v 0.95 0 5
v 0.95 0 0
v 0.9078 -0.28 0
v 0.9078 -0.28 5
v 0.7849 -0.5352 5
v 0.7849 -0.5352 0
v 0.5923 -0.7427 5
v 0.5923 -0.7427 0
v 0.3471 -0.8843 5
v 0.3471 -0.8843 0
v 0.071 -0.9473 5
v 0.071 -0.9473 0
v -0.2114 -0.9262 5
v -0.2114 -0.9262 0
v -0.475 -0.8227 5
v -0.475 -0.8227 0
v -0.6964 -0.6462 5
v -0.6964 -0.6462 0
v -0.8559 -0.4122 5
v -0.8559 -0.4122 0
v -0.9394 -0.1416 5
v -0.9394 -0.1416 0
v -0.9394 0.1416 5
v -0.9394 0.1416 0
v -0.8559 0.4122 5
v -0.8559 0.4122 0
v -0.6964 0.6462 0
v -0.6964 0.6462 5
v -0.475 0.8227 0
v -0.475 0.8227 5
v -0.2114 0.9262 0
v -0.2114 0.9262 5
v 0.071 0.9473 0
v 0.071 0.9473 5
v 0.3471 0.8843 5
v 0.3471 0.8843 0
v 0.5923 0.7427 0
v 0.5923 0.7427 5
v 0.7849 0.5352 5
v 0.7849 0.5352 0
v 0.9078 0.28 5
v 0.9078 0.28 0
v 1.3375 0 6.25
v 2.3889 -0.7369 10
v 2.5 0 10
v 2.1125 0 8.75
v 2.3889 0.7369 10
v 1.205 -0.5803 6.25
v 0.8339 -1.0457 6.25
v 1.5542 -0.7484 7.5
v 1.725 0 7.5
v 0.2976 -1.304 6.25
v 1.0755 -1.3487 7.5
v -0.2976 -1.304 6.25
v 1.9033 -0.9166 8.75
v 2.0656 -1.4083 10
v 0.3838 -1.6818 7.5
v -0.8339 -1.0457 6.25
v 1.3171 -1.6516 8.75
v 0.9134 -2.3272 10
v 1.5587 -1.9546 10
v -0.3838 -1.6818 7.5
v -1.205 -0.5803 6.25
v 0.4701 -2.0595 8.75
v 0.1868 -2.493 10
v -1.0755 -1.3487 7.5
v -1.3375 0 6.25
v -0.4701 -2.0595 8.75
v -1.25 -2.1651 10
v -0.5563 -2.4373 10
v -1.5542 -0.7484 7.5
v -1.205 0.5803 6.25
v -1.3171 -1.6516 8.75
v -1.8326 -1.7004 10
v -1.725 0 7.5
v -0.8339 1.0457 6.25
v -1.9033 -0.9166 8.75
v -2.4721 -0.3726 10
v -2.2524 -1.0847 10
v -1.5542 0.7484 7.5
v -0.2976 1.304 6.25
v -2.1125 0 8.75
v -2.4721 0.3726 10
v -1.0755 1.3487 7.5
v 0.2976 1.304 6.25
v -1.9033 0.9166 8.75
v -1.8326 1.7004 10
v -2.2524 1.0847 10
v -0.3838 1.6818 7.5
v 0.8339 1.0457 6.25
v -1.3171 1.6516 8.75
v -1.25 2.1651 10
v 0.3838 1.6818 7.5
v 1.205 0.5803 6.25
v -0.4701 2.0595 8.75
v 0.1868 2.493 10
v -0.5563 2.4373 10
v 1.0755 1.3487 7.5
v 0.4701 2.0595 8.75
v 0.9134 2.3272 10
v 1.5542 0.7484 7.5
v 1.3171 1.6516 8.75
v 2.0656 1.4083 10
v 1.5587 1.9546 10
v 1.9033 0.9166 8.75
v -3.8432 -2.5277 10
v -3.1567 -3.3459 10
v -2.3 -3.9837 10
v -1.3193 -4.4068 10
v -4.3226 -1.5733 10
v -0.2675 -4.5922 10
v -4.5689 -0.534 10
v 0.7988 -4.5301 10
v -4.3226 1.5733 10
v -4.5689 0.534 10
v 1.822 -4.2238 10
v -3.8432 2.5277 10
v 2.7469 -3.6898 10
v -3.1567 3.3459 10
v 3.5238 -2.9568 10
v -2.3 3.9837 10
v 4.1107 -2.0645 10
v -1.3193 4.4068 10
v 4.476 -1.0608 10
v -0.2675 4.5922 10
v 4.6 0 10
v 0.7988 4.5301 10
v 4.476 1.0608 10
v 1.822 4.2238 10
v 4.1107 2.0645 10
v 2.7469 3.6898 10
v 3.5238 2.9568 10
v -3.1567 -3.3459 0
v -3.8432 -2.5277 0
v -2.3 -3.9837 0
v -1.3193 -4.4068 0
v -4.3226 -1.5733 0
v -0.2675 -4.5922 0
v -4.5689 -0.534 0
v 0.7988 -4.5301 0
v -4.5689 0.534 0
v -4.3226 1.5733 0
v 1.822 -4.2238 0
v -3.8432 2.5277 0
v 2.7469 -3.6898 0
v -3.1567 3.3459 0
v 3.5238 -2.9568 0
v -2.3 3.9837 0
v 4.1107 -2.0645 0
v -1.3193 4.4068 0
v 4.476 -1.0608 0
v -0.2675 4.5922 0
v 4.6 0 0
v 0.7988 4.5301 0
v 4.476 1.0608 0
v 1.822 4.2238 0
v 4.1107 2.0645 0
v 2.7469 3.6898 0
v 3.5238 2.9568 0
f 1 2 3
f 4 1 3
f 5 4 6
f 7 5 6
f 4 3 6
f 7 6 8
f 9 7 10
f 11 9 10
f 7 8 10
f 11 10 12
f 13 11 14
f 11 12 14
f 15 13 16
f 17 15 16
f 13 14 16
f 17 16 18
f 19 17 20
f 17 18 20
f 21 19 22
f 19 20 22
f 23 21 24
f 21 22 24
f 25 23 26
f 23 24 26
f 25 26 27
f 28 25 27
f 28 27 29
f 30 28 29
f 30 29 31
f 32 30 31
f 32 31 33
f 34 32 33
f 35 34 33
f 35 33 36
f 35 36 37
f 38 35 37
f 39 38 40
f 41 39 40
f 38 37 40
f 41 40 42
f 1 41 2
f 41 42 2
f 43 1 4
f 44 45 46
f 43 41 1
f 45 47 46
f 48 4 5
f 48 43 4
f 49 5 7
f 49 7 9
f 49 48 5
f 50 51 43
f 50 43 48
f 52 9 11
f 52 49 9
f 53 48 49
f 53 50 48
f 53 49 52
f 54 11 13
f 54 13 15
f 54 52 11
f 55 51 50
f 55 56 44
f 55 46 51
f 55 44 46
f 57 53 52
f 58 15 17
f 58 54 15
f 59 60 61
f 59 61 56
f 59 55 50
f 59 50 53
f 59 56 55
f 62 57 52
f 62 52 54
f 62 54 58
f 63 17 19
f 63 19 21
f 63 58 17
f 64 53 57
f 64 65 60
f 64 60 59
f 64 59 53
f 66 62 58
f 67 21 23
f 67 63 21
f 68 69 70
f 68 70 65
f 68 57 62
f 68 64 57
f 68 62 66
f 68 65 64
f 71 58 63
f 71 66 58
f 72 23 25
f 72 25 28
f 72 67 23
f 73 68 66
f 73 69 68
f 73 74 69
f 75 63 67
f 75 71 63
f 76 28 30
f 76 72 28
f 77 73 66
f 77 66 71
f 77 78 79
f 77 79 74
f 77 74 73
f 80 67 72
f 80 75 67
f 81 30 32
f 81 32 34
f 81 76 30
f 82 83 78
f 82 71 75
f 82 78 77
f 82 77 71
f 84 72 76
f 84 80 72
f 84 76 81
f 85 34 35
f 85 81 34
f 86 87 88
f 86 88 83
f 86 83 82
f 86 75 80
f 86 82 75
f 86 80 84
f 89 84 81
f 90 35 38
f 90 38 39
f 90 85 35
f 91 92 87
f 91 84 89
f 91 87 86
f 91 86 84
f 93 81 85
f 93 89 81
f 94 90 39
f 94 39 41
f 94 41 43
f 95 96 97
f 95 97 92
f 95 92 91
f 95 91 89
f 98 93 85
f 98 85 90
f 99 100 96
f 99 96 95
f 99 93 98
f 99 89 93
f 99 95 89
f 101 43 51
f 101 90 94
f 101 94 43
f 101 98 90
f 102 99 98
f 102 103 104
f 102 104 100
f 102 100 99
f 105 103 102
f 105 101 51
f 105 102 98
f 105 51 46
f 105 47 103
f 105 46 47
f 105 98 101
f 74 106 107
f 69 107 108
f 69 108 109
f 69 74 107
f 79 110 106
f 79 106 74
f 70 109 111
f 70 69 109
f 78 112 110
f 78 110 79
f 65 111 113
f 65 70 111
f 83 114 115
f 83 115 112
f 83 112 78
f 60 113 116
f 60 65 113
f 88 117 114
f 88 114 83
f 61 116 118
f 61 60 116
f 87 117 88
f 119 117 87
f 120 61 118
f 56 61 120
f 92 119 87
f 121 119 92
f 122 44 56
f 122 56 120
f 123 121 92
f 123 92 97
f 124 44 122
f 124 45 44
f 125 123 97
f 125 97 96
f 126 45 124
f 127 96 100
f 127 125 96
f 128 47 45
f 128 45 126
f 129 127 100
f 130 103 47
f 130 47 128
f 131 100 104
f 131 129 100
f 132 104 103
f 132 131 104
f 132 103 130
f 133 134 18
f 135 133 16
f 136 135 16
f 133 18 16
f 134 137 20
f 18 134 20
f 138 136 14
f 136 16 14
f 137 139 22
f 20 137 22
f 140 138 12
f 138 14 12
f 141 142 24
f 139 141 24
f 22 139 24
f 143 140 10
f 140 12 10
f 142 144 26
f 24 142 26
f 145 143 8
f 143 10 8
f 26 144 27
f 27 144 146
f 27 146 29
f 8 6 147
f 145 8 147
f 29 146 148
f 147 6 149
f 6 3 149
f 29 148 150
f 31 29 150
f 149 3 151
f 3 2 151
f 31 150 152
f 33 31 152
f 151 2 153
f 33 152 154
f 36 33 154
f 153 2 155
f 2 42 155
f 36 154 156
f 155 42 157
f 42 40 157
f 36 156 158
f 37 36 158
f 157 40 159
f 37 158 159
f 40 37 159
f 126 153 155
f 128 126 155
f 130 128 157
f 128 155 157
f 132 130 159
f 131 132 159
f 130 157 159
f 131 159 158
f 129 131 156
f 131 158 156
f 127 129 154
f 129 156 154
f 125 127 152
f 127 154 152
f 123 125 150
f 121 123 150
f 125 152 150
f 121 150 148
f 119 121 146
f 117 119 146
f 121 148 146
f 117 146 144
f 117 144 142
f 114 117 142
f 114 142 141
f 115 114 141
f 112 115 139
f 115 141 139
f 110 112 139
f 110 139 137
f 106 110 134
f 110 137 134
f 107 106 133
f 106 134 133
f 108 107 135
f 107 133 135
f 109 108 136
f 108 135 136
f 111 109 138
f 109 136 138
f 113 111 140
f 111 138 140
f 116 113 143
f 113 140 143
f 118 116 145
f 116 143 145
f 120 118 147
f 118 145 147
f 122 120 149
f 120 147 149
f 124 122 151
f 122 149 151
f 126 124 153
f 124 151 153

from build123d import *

# Parameters (mm, degrees)
F0_R      = 4.6
F1_DEPTH  = 10
F2_R      = 0.95
F4_DEPTH  = 5
F4_FACE_R = 0.95
F3_R      = 2.5


with BuildPart() as f1:
    # F0 (on Top) → F1 (new body)
    with BuildSketch(Plane.XY):
        Circle(F0_R)
    extrude(amount=F1_DEPTH)

    # F2 (on face) → F4 (cut)
    with BuildSketch(Plane(origin=(0, 0, 0), x_dir=(1, 0, 0), z_dir=(0, 0, -1))):
        Circle(F2_R)
    extrude(amount=-F4_DEPTH, mode=Mode.SUBTRACT)

    # F4_face (on face) → F5 section 0
    with BuildSketch(Plane(origin=(0, 0, 5), x_dir=(1, 0, 0), z_dir=(0, 0, -1))):
        Circle(F4_FACE_R)
    # F3 (on face) → F5 section 1
    with BuildSketch(Plane.XY.offset(10)):
        Circle(F3_R)
    loft(mode=Mode.SUBTRACT)


solid = f1.part
